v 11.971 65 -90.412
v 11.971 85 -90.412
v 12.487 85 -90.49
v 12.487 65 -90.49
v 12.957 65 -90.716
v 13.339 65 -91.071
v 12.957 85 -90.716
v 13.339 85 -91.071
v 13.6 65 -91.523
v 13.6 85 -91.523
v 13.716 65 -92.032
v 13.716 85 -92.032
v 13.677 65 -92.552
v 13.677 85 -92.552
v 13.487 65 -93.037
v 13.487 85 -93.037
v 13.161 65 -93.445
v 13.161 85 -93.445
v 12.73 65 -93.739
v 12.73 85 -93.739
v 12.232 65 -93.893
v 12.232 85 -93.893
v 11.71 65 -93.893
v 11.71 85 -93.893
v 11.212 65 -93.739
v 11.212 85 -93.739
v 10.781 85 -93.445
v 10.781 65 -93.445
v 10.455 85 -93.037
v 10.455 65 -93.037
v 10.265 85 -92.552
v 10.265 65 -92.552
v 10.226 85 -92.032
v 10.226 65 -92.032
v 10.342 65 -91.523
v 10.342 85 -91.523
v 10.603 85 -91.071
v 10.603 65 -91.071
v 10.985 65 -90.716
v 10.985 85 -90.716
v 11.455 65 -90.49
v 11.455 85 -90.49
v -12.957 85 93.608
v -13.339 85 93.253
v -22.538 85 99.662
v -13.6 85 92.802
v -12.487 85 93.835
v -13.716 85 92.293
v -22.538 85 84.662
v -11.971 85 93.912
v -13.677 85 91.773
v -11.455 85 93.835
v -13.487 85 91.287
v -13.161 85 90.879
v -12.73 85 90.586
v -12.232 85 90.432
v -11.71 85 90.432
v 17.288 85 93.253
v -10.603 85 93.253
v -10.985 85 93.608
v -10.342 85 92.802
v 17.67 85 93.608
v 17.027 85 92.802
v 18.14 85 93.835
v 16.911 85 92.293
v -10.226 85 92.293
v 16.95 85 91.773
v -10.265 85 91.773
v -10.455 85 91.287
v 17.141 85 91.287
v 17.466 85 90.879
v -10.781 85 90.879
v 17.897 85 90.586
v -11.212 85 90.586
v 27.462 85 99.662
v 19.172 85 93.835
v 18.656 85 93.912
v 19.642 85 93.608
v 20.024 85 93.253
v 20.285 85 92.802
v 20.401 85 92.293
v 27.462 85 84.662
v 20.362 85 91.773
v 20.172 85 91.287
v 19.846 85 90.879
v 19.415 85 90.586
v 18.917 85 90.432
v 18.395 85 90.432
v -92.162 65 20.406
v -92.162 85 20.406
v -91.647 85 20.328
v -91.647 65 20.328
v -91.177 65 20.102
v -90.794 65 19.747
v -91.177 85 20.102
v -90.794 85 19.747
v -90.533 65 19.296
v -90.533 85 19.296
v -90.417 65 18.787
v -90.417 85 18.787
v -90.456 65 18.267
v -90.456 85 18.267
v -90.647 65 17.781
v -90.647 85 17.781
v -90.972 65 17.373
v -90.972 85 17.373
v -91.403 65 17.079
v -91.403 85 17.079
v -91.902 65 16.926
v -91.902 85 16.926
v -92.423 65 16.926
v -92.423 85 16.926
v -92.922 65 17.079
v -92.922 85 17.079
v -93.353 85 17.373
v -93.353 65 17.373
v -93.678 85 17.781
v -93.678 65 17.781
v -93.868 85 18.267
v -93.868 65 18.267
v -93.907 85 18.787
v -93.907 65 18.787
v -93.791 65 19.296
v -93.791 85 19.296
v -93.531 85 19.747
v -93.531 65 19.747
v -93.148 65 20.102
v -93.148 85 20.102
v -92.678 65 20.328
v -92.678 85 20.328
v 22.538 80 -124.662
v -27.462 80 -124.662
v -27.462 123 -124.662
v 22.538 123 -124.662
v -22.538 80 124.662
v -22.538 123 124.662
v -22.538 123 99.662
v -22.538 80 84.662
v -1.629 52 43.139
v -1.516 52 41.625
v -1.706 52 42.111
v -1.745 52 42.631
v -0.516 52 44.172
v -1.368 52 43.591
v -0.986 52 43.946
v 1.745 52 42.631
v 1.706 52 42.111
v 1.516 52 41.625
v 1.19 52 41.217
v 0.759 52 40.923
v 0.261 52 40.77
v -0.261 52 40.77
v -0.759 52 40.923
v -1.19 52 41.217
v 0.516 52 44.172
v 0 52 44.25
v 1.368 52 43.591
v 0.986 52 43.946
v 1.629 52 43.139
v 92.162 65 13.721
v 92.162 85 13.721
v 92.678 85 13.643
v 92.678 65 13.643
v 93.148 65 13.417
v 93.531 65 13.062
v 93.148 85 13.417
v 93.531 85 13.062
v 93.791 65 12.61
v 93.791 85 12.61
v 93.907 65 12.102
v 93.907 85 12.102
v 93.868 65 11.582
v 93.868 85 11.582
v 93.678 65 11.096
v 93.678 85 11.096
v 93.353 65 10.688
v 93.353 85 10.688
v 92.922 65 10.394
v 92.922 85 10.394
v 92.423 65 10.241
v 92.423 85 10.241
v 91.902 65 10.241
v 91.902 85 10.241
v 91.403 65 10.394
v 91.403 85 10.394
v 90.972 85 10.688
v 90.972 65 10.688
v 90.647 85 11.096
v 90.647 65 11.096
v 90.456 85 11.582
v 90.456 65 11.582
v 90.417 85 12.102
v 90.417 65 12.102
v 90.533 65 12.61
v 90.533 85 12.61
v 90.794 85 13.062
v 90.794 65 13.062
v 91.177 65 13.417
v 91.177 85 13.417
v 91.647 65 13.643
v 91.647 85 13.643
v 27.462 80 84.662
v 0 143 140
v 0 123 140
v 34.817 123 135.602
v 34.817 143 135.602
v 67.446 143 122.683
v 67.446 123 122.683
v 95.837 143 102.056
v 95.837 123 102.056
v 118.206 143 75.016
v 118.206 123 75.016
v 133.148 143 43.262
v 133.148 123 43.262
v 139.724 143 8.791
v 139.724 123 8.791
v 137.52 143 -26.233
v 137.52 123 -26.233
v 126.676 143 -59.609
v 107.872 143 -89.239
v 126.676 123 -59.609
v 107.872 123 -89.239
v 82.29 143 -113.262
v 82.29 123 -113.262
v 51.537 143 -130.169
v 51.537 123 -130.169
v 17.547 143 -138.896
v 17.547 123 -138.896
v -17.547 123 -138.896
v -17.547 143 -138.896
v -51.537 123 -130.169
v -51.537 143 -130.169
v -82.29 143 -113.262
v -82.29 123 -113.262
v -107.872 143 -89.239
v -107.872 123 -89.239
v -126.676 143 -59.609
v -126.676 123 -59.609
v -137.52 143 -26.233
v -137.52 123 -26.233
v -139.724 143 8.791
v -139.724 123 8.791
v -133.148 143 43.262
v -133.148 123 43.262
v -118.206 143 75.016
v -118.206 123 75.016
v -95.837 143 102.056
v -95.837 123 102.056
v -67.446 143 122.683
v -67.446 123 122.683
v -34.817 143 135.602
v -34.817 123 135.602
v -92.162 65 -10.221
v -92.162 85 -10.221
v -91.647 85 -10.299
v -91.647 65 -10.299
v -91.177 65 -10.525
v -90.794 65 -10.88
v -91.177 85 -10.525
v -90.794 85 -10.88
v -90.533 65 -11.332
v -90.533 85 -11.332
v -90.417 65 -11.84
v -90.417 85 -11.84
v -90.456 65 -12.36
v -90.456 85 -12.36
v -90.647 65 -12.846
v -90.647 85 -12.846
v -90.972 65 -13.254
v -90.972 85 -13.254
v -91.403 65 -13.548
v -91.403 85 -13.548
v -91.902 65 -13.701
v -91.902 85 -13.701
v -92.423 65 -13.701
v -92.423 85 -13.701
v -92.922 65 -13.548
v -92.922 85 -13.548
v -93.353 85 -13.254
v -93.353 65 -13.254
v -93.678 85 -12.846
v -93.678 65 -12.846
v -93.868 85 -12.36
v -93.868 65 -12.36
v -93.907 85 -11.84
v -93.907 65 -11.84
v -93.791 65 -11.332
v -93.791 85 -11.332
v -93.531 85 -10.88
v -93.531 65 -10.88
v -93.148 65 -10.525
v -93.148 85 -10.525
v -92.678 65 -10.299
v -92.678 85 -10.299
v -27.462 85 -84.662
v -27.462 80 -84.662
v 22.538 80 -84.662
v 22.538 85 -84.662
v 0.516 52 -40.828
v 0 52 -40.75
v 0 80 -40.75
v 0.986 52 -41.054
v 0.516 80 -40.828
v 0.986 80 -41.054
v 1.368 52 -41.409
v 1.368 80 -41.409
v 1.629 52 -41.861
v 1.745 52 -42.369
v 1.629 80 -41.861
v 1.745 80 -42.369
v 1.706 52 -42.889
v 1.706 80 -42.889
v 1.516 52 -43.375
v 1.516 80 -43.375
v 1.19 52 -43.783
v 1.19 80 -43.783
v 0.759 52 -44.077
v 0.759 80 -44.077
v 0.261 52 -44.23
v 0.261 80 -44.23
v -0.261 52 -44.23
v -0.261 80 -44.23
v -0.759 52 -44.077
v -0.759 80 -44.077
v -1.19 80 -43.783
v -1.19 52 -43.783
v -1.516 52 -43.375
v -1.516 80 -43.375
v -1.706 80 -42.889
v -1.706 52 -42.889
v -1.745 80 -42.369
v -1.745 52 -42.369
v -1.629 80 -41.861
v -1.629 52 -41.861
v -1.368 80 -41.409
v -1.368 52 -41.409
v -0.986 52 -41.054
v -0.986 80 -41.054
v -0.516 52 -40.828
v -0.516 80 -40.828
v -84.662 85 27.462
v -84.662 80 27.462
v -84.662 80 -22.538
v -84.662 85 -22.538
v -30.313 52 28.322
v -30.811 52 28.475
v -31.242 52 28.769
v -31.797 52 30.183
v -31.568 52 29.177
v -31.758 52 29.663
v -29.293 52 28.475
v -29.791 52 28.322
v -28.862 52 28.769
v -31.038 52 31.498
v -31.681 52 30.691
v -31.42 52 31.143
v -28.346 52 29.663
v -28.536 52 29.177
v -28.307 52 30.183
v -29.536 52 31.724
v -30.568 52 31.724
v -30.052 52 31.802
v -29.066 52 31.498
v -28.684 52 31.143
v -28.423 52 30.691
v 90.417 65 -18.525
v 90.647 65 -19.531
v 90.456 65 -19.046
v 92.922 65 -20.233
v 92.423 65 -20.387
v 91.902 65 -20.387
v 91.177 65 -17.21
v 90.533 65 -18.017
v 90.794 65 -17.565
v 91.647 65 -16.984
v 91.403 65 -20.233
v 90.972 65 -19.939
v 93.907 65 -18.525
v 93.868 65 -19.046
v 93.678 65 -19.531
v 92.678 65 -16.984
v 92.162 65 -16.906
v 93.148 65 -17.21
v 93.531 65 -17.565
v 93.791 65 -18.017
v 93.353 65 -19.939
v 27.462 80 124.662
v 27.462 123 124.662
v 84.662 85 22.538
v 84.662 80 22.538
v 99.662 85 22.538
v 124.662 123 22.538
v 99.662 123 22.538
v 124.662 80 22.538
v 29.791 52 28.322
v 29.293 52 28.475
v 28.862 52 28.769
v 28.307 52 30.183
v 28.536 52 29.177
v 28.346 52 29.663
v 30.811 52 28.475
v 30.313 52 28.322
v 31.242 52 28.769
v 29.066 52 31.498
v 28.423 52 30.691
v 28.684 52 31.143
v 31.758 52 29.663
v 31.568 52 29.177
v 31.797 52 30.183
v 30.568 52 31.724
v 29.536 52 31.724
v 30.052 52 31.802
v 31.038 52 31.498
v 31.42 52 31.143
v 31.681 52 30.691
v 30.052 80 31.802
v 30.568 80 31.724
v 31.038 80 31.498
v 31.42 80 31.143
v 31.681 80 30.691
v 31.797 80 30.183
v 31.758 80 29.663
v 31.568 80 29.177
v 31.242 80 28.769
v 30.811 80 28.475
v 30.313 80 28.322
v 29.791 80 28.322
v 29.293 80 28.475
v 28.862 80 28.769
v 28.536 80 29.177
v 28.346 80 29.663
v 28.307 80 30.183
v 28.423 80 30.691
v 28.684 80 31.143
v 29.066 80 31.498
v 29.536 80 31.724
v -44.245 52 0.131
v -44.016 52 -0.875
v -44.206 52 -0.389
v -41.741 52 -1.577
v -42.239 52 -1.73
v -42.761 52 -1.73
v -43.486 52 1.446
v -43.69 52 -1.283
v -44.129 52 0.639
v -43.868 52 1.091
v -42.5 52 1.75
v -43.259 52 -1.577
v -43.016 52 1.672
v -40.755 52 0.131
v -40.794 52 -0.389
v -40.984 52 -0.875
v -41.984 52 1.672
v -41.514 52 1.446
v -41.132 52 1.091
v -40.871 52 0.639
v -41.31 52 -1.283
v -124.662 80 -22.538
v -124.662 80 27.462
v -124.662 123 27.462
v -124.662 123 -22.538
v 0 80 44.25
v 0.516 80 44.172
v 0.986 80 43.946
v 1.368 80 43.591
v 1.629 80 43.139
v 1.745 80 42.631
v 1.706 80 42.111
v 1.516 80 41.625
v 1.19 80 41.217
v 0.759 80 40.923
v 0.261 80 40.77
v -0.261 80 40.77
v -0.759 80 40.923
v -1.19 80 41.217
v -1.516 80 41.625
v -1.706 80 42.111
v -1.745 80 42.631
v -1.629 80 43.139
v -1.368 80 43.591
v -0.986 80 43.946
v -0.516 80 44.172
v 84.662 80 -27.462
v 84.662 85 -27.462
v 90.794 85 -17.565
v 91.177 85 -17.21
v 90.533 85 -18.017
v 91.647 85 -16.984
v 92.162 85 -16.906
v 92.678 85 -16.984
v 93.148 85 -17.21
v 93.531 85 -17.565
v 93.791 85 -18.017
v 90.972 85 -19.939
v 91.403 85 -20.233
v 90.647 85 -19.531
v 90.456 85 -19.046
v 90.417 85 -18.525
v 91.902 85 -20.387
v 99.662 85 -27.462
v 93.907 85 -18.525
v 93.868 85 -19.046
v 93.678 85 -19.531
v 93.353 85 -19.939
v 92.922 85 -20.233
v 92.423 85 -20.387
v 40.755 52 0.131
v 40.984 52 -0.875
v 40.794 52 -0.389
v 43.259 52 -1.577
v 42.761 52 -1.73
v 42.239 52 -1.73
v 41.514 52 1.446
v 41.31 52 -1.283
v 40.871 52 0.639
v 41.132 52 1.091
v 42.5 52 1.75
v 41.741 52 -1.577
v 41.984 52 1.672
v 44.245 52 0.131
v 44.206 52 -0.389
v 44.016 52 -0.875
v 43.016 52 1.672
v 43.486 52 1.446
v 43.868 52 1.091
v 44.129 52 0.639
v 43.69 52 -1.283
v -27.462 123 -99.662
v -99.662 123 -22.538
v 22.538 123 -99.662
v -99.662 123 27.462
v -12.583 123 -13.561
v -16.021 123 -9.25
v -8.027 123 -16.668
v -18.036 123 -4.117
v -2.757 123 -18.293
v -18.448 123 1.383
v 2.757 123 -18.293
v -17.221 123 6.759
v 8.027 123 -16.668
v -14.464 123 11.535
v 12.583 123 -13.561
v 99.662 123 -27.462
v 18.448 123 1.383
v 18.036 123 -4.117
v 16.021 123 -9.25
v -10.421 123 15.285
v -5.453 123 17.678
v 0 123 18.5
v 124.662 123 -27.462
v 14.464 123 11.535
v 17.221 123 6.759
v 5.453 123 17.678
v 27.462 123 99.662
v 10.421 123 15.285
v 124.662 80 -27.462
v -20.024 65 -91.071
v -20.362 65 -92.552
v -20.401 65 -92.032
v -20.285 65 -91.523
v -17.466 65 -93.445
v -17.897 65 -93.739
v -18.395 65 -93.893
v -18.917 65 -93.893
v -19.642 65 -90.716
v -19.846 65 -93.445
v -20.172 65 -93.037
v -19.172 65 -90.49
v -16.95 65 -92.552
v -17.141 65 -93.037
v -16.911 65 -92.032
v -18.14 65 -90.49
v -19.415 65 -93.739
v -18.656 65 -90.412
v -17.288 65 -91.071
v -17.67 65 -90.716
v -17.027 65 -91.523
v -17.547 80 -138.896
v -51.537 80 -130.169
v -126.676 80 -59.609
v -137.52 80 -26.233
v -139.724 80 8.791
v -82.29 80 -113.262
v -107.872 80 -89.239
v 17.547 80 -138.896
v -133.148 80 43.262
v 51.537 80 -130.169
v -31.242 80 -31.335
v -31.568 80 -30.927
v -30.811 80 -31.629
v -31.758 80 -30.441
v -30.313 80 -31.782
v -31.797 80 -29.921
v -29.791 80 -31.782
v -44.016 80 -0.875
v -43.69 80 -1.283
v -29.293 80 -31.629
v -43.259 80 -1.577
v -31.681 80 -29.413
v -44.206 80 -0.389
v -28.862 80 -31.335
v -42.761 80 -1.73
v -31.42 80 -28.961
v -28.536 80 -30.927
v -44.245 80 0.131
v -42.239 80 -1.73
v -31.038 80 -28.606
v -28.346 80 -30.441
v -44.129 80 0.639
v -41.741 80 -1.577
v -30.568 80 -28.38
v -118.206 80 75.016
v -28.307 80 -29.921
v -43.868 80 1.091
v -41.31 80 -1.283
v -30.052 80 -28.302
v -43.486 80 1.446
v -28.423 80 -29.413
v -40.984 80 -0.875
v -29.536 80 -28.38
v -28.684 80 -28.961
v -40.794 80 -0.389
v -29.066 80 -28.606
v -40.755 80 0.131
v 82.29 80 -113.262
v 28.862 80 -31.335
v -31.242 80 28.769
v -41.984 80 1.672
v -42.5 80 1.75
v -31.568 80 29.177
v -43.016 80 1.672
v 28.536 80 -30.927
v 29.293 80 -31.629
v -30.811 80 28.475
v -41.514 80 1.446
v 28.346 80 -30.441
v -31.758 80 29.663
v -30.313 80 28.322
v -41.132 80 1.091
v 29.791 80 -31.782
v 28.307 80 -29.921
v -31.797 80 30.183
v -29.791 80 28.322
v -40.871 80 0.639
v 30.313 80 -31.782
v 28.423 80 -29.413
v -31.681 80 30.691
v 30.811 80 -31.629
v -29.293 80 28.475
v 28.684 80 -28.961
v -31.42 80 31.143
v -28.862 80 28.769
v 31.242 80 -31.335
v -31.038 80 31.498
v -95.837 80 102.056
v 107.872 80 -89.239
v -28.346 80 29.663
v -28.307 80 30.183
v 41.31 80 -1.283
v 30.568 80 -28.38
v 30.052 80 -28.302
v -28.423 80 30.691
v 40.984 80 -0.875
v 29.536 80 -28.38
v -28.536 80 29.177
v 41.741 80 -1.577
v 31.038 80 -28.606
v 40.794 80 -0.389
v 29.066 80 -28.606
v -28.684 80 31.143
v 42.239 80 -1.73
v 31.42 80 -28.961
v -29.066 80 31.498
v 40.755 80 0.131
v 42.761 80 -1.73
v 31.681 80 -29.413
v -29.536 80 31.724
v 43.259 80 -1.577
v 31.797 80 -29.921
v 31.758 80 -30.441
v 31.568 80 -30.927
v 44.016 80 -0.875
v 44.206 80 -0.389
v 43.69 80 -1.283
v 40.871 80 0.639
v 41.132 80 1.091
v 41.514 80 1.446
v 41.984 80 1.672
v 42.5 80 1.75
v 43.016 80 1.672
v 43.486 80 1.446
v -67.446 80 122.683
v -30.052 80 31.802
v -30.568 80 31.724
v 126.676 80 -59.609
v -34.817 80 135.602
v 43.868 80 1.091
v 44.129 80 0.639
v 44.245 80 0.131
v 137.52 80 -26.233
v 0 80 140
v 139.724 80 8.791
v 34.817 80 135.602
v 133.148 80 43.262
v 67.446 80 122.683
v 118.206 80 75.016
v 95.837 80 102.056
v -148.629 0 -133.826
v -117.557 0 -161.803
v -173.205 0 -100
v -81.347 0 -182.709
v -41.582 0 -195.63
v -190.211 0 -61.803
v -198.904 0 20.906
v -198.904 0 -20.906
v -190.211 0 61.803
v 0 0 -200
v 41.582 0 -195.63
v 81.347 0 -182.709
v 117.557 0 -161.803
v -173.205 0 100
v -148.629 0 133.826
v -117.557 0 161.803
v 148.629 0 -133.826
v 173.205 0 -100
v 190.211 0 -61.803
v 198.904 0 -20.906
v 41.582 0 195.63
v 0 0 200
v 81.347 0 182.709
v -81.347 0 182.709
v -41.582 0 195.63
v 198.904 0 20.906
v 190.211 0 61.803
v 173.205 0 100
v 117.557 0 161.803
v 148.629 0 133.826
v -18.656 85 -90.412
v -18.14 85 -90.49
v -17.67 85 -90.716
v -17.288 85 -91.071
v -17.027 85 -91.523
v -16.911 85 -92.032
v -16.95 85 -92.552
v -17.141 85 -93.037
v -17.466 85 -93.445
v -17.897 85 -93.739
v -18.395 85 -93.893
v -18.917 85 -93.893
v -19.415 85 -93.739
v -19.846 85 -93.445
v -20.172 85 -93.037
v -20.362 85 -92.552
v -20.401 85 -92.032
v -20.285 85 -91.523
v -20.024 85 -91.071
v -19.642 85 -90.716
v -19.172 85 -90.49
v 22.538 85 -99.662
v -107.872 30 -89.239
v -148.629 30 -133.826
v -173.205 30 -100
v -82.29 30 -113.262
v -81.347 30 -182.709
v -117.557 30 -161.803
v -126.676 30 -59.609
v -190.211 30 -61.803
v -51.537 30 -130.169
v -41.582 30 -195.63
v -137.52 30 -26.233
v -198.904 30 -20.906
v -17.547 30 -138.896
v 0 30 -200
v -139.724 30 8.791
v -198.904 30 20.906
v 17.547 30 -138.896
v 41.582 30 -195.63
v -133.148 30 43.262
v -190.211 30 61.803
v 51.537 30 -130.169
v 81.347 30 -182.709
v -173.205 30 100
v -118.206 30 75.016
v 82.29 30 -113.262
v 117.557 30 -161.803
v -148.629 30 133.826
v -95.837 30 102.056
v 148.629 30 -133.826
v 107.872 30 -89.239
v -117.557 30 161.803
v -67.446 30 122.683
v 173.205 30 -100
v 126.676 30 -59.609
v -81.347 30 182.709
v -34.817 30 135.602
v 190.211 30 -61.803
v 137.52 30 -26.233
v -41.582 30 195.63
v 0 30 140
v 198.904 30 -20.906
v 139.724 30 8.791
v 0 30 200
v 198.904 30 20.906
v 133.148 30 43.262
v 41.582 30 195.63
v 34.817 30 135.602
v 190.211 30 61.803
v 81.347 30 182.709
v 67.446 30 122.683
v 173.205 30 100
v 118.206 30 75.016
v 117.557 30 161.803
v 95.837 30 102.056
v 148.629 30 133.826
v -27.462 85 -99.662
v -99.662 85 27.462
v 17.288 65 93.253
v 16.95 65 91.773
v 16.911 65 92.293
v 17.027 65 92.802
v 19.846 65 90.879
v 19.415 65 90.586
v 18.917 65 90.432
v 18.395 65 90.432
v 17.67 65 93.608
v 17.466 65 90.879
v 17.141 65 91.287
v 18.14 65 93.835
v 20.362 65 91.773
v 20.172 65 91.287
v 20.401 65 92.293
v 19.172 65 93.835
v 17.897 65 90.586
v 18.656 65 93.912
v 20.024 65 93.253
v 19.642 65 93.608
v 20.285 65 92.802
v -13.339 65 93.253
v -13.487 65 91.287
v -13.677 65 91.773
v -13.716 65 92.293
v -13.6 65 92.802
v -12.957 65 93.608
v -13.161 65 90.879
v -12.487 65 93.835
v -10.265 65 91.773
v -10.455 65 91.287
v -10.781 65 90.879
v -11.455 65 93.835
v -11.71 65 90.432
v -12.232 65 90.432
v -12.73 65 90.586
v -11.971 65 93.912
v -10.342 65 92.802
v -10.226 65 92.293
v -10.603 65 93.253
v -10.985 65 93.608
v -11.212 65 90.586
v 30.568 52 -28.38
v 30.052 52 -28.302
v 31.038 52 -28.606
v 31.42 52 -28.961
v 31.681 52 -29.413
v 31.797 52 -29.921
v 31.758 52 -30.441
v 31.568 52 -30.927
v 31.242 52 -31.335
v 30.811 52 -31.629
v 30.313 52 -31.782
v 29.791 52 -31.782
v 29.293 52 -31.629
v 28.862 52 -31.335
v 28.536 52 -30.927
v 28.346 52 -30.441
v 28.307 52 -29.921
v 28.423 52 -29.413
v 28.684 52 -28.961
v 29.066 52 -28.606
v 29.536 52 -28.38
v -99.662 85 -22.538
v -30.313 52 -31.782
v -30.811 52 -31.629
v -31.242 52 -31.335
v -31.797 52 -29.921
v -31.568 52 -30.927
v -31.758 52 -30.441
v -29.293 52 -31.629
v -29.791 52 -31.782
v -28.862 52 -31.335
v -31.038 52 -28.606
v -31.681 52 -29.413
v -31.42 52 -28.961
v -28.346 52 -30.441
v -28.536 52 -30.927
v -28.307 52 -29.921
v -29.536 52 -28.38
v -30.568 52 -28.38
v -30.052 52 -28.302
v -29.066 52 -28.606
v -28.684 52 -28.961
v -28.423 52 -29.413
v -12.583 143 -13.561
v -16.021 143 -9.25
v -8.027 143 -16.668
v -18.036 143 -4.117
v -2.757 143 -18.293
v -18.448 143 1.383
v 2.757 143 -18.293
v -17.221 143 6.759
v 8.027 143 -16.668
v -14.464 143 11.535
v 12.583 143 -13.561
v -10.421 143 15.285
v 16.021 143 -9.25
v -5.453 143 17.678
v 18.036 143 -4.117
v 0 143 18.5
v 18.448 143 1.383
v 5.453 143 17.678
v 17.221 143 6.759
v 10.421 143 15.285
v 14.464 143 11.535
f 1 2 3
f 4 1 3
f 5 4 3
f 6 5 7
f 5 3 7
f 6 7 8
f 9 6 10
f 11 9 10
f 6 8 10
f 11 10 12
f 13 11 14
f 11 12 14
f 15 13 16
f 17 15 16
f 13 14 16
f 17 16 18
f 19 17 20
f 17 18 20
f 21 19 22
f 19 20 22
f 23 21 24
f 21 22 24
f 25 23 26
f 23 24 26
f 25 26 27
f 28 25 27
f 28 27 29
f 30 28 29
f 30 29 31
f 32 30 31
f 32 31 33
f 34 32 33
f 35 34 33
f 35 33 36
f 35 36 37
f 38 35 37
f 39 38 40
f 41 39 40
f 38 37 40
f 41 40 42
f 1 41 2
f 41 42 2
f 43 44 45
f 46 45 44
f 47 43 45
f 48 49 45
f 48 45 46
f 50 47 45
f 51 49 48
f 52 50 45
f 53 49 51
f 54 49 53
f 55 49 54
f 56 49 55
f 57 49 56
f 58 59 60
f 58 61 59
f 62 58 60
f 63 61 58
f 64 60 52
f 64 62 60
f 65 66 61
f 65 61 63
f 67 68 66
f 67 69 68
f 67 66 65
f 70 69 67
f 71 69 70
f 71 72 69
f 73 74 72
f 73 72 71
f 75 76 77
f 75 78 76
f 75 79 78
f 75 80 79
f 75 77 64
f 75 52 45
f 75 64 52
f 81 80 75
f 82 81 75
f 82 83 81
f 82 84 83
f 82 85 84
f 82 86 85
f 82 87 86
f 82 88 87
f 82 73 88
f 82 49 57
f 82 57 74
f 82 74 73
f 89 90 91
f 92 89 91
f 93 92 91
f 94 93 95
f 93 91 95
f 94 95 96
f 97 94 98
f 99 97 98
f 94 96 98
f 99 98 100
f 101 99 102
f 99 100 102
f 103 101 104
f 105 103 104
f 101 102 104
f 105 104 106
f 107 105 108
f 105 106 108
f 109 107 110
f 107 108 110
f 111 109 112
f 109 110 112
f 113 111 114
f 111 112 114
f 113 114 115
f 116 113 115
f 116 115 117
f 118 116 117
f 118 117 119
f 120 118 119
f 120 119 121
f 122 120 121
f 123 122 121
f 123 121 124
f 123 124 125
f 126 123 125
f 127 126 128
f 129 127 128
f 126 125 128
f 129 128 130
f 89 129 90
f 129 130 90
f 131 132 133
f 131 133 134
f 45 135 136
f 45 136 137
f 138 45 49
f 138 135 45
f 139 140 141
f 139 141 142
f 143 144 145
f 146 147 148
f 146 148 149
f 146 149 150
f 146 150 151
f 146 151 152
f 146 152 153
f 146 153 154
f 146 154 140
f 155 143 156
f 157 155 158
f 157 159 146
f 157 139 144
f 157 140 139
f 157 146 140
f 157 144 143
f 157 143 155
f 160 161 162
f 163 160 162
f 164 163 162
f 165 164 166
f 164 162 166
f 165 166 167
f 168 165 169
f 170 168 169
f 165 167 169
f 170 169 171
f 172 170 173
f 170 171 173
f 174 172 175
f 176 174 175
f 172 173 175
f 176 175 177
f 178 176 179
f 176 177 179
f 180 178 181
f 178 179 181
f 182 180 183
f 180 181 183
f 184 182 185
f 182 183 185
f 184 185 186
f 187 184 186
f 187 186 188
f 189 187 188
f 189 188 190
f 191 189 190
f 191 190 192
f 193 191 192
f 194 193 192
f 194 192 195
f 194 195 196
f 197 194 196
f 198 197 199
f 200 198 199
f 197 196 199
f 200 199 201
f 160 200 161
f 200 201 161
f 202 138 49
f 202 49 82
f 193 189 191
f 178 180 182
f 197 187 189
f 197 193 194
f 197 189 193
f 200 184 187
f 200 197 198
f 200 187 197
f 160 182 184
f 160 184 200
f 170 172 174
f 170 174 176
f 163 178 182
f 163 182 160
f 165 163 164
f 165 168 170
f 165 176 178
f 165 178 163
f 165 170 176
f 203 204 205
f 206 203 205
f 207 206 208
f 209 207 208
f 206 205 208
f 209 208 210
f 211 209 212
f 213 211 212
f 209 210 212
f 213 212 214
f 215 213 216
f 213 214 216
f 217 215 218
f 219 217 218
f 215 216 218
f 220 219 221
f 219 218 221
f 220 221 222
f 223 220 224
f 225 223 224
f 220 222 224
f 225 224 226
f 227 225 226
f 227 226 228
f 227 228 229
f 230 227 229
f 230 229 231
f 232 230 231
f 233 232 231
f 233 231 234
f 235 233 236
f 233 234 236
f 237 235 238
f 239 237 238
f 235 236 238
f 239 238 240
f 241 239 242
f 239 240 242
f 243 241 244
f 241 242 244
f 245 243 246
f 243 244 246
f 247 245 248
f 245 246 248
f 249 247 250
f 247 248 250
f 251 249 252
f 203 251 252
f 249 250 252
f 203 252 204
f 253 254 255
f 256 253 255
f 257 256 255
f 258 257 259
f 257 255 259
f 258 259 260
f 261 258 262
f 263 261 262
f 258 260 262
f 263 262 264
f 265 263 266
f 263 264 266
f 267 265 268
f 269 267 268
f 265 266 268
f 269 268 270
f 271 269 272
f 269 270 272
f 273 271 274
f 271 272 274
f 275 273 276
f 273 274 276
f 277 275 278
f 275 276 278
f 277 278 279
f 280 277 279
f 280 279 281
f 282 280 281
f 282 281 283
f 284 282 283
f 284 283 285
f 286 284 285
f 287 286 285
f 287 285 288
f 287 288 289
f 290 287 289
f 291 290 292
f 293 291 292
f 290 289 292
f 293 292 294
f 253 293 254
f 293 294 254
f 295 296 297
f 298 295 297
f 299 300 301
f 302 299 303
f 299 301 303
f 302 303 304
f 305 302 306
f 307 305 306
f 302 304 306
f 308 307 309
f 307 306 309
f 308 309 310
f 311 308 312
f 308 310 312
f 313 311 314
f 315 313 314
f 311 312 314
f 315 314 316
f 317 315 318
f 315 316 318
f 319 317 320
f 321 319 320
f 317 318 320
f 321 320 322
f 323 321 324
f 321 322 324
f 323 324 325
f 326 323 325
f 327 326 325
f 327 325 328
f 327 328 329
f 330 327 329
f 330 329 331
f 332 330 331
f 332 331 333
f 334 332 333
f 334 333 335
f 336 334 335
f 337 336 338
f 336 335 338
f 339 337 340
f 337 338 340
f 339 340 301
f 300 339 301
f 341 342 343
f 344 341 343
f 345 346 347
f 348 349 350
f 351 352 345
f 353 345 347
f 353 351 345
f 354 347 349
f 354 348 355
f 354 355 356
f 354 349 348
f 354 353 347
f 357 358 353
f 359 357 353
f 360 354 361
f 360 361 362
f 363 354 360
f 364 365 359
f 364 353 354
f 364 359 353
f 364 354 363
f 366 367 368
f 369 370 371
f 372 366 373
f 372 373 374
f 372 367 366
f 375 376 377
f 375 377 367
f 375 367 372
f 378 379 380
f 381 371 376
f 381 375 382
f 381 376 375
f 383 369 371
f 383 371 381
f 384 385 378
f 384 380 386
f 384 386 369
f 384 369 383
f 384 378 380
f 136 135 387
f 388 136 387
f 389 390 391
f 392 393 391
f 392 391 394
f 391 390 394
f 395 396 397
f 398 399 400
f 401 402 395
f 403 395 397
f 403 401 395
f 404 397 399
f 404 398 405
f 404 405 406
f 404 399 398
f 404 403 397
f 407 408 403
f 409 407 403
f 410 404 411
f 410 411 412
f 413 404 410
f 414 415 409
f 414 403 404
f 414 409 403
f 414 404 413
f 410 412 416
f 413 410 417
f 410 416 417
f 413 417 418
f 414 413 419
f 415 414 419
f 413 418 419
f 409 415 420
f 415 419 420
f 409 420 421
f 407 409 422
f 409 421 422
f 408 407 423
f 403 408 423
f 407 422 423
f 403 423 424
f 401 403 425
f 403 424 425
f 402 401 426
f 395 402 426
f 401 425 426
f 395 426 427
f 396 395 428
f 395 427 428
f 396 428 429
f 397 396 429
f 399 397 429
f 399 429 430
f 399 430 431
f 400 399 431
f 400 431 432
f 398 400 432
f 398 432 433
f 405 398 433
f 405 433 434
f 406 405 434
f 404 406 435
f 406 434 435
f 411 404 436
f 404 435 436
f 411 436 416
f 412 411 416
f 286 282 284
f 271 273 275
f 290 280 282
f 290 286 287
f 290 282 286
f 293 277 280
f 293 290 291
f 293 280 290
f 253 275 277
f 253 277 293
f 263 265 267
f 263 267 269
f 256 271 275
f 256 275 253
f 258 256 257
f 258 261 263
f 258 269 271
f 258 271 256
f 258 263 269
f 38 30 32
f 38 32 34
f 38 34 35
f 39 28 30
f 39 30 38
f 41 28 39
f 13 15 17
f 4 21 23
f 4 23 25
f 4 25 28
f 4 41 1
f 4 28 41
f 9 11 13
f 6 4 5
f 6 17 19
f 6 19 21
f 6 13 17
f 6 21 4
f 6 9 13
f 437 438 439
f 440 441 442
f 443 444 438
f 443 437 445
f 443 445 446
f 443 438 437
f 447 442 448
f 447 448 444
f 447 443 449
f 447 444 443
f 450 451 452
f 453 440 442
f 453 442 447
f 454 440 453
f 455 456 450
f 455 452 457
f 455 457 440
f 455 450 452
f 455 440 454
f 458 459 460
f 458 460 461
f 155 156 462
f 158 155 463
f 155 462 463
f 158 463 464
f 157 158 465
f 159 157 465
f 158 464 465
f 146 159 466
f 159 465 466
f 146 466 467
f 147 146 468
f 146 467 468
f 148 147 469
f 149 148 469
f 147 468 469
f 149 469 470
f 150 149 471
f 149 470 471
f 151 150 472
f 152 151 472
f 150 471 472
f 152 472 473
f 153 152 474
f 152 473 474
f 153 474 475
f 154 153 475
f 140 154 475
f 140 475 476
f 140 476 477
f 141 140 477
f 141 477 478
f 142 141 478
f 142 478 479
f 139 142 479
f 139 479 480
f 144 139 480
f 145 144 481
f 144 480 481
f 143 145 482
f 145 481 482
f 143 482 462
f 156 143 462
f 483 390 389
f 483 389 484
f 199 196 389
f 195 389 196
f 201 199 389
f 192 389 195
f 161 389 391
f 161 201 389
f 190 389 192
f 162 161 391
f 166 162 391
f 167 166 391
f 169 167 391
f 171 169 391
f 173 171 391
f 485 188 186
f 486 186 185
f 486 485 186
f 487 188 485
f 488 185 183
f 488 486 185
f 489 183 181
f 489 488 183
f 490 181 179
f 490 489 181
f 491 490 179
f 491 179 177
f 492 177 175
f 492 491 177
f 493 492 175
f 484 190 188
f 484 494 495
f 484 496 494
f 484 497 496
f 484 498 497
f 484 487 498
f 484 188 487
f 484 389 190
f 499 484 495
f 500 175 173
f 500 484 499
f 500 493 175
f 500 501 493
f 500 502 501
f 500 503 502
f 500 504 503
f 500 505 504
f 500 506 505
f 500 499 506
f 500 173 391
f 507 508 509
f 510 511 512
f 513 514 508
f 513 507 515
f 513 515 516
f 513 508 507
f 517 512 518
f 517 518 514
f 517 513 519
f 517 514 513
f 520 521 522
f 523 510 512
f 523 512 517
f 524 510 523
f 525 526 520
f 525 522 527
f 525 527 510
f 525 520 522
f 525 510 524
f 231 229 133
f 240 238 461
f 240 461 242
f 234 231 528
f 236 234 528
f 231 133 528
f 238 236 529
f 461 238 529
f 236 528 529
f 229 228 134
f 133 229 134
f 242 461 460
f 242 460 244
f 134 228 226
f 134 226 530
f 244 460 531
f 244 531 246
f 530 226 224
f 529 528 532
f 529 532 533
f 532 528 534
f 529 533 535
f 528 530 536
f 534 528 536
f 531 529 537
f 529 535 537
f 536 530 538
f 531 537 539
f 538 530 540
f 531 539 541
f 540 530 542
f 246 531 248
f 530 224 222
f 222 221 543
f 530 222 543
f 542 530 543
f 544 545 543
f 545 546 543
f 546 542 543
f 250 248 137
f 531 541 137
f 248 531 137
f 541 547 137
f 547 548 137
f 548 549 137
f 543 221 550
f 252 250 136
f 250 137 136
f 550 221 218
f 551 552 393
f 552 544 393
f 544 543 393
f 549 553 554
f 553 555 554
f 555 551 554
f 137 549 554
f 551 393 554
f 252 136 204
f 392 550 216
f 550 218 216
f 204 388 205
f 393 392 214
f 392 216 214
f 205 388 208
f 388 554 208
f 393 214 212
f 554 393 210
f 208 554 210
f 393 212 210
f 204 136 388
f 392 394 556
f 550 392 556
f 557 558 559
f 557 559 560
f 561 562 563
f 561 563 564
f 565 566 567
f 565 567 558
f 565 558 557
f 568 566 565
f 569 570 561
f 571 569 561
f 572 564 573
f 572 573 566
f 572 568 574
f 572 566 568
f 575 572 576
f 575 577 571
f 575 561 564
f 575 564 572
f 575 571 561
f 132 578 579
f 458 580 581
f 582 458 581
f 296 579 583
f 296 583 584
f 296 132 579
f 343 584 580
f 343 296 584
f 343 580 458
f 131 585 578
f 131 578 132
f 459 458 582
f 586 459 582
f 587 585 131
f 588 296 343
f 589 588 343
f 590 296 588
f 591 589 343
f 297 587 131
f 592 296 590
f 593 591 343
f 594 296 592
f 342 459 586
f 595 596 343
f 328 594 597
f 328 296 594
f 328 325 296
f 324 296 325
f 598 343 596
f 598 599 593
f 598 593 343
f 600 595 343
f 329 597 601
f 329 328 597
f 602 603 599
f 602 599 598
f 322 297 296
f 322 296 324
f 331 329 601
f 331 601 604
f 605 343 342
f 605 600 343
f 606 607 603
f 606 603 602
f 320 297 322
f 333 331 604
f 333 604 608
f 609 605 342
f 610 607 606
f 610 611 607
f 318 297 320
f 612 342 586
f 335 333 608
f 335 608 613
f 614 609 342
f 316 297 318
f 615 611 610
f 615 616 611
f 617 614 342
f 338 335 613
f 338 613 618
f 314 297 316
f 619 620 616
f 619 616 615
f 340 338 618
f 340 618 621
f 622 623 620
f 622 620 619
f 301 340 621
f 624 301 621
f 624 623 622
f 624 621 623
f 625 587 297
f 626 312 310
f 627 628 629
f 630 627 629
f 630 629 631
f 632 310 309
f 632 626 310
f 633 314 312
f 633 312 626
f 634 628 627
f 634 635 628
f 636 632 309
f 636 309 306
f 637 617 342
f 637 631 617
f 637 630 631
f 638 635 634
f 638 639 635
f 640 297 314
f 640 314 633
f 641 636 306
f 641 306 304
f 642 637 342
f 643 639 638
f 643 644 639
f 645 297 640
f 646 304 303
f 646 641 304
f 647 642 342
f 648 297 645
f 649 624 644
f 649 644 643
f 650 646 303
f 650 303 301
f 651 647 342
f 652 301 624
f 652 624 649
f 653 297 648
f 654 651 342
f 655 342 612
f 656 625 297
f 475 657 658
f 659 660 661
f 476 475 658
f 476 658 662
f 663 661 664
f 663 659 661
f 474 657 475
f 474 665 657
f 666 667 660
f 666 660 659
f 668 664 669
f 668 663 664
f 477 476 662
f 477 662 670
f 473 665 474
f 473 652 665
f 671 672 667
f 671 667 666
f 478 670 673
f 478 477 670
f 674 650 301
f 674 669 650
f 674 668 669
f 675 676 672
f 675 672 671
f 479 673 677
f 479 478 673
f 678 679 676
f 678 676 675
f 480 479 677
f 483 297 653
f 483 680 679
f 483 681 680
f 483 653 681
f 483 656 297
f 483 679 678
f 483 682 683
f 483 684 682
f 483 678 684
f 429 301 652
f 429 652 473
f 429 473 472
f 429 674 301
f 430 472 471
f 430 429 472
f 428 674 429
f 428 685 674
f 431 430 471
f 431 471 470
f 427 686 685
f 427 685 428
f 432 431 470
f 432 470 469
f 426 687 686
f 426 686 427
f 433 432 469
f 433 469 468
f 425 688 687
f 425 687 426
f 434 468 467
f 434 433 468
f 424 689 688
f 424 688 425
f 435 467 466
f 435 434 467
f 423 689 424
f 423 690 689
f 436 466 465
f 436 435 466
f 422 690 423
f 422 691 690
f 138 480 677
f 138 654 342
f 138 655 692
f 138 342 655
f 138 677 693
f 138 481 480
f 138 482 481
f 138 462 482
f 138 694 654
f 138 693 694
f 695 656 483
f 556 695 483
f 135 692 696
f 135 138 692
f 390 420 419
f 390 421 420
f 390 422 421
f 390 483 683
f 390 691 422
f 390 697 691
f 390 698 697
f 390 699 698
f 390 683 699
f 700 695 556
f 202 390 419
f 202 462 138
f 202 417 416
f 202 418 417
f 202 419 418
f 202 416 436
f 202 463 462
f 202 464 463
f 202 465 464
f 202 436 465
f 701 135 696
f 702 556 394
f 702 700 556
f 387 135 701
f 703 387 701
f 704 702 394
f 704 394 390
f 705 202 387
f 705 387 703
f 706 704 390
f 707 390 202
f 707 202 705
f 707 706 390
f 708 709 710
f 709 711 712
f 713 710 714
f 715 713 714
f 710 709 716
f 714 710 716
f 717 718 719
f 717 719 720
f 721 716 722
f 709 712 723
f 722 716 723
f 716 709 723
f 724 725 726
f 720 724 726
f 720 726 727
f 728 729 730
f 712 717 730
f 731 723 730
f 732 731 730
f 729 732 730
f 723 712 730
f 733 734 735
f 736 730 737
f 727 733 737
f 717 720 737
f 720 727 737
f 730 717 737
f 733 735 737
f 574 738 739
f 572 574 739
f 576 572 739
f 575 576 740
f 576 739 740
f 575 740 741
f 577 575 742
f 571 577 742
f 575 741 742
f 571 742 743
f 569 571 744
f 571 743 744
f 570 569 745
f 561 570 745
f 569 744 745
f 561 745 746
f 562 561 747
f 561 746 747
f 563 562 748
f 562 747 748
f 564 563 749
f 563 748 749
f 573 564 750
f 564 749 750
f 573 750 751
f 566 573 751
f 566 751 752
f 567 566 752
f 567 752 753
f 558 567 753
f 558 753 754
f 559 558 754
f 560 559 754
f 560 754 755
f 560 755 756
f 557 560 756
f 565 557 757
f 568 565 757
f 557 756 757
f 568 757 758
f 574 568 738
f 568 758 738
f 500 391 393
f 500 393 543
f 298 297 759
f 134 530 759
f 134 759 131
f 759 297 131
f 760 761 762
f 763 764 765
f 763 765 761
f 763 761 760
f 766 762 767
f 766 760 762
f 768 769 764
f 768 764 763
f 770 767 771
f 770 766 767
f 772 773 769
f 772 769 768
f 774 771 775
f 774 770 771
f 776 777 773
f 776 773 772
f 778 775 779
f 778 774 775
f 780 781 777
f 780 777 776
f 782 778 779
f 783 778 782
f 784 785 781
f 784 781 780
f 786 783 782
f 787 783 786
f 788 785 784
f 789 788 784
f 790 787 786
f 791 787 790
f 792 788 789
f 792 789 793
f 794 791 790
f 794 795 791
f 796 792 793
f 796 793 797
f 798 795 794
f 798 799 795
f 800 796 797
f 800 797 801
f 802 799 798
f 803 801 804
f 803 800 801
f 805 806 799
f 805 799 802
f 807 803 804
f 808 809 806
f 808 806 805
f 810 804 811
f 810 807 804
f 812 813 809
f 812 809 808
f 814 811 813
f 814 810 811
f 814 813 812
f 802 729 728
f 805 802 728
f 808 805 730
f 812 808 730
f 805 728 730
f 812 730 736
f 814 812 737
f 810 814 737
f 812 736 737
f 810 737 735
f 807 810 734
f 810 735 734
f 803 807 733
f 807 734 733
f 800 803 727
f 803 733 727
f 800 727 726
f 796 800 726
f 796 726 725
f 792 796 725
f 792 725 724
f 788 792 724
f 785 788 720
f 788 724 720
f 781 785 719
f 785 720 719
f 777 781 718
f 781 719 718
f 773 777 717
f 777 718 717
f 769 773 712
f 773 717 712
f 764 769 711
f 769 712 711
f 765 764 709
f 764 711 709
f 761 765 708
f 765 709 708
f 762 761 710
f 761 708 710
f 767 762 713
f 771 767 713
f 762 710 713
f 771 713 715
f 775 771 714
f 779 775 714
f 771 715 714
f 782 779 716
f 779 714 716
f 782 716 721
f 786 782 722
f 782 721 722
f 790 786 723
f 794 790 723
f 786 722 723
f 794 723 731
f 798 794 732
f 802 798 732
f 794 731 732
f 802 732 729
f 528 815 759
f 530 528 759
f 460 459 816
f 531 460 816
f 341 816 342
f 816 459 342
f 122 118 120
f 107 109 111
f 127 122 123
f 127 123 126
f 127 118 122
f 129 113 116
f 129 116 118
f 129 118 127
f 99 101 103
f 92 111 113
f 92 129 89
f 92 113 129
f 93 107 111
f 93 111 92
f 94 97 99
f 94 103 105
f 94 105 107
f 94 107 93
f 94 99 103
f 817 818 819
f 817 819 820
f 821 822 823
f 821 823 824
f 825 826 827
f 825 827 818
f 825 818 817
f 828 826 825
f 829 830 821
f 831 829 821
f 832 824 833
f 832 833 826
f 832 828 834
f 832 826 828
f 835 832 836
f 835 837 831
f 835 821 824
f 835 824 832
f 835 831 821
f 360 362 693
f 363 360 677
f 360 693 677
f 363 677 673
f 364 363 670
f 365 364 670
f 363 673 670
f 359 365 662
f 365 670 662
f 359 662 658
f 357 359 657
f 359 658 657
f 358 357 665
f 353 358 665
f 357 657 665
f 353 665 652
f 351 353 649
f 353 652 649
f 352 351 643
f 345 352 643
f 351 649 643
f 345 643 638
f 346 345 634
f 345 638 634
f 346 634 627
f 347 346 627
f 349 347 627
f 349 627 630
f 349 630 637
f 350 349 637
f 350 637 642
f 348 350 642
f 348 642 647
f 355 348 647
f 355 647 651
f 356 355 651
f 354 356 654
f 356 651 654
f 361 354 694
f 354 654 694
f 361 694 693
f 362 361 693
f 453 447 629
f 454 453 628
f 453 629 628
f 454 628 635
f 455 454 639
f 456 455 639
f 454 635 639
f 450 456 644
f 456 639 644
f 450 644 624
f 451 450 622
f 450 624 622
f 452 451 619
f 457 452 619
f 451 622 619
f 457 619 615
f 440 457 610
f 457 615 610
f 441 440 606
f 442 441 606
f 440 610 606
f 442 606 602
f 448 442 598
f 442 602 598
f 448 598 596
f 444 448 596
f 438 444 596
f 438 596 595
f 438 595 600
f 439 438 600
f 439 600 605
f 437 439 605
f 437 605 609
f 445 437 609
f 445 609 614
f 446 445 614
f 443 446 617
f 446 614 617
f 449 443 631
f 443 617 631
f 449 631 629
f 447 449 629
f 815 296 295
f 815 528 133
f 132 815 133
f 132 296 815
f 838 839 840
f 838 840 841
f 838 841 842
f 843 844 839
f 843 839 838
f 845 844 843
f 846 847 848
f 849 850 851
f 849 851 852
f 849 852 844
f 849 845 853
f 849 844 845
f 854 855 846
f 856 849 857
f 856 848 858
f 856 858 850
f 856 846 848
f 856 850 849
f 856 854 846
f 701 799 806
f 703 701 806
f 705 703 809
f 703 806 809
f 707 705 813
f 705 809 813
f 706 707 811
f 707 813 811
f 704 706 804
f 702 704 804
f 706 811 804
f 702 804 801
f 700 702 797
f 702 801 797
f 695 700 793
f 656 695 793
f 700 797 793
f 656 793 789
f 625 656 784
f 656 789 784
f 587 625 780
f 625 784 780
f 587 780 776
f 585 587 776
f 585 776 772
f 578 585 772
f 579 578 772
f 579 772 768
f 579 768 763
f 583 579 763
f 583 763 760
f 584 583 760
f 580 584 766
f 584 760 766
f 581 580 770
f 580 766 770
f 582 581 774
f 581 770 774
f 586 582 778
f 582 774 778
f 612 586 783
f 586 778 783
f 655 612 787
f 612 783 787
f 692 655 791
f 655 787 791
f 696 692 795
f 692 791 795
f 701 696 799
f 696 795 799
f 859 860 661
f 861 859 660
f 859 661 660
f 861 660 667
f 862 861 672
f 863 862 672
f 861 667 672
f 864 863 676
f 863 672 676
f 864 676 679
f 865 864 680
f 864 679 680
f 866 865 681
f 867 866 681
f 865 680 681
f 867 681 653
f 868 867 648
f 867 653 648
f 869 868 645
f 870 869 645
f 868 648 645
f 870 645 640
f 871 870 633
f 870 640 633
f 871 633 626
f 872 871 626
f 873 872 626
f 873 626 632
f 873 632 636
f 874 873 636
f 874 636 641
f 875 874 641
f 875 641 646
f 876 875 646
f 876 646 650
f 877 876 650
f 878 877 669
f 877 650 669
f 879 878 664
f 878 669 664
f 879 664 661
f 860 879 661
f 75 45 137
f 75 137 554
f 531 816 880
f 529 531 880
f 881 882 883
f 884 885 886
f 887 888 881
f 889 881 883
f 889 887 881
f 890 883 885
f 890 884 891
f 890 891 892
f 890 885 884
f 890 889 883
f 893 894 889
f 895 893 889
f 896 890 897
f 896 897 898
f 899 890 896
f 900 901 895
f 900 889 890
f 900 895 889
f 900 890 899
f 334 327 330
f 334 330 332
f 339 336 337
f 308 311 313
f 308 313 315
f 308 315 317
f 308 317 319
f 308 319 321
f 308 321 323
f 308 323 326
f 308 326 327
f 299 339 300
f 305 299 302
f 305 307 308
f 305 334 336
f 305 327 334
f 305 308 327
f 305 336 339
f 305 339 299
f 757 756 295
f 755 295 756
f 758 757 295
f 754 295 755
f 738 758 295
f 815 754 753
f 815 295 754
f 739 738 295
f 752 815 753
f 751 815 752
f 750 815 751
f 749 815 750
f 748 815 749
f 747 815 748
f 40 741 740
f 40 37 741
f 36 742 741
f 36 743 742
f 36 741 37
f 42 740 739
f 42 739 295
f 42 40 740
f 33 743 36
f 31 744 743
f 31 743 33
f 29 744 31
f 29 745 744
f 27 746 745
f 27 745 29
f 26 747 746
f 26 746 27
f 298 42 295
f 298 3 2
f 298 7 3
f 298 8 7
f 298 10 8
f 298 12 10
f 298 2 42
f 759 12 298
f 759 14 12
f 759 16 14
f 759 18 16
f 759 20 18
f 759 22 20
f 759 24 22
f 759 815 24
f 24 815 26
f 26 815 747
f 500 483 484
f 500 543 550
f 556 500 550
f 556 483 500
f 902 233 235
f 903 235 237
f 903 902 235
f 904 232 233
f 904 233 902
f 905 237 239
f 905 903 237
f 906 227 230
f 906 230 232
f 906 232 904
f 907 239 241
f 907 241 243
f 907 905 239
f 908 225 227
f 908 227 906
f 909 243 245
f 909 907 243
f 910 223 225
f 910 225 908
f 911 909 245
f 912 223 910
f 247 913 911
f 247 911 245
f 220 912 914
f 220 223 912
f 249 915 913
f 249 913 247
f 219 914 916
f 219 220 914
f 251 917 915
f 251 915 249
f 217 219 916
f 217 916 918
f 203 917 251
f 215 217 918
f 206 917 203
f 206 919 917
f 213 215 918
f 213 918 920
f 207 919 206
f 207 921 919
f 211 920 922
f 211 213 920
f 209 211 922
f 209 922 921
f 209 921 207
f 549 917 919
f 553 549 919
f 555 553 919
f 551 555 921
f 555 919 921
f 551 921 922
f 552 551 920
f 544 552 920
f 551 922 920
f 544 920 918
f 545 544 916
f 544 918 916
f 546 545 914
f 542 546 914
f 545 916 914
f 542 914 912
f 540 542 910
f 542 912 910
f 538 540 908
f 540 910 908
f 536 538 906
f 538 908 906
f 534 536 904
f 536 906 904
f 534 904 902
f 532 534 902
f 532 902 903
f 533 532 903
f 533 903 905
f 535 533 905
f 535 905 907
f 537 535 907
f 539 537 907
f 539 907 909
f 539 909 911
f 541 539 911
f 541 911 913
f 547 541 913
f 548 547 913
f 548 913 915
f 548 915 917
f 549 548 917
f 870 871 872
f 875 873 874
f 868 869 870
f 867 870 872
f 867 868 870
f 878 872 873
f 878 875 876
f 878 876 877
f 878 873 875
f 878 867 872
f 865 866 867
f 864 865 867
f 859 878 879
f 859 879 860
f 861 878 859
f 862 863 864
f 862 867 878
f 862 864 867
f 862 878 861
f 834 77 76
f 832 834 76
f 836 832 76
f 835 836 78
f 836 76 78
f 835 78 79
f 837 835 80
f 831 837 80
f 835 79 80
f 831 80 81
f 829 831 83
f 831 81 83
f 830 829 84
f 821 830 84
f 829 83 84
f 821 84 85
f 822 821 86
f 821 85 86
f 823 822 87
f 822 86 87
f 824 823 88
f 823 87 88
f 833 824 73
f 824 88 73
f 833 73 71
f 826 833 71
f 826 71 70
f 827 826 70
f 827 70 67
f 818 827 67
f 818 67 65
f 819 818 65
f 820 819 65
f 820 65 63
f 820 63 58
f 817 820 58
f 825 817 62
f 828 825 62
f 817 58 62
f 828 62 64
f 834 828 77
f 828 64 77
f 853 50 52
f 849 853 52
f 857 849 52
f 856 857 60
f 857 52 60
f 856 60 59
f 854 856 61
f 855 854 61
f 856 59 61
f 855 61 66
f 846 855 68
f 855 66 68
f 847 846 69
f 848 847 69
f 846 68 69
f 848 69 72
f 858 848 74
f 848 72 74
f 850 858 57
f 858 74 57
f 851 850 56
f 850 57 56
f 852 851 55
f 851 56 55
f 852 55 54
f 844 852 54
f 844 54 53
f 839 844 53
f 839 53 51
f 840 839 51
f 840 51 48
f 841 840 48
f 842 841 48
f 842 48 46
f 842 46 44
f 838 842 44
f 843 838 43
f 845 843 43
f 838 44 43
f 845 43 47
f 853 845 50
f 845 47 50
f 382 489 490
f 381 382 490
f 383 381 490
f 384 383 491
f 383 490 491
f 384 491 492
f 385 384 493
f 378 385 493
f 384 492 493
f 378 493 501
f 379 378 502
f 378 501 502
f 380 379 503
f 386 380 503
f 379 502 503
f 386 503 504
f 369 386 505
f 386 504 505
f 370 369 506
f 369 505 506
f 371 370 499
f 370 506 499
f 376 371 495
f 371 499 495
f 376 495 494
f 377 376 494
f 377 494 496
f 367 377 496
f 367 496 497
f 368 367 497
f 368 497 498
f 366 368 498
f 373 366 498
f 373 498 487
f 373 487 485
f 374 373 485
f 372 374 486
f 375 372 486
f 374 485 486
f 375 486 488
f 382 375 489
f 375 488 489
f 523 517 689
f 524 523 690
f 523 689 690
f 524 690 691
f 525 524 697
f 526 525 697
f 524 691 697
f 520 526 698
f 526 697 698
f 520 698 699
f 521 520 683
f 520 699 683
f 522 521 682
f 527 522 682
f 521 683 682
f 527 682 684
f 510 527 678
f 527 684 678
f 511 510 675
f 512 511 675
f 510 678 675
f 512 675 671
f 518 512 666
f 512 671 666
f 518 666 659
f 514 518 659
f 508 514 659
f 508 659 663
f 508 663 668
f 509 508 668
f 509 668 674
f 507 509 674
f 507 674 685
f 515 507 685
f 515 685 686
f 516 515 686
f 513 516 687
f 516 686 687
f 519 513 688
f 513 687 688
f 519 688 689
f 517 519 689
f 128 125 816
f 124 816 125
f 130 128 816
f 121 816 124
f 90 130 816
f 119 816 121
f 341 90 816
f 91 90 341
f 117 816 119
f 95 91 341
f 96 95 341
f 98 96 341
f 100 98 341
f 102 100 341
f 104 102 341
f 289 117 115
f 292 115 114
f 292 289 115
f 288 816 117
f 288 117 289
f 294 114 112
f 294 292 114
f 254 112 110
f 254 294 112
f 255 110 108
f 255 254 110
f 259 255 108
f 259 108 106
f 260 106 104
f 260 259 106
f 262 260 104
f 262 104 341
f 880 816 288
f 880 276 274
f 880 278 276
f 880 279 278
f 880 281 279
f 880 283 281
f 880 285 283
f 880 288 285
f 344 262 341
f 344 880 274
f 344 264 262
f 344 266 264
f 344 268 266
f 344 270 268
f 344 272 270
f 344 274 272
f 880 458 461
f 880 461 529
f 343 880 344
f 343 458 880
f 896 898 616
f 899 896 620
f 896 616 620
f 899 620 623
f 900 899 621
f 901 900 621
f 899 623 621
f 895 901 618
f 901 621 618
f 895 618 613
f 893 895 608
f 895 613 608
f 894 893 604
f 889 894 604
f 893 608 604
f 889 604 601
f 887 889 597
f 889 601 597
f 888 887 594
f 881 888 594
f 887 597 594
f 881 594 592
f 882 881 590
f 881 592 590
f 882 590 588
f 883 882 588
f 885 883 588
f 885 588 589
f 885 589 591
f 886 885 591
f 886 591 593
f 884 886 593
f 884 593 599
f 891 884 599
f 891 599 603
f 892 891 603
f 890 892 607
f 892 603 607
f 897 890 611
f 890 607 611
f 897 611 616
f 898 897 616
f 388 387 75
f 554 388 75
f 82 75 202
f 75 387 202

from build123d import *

# Parameters (mm, degrees)
SKETCH_1_R          = 200
EXTRUDE_1_DEPTH     = 30
SKETCH_2_R          = 140
EXTRUDE_2_DEPTH     = 50
SKETCH_4_R          = 1.75
CUT_EXTRUDE_1_DEPTH = 28
SKETCH_7_W          = 25
SKETCH_7_H          = 50
SKETCH_7_W_2        = 50
SKETCH_7_H_2        = 25
EXTRUDE_5_DEPTH     = 43
SKETCH_8_W          = 15
SKETCH_8_H          = 50
SKETCH_8_W_2        = 50
SKETCH_8_H_2        = 15
EXTRUDE_6_DEPTH     = 5
SKETCH_9_R          = 1.75
CUT_EXTRUDE_2_DEPTH = 20
SKETCH_10_R         = 140
EXTRUDE_7_DEPTH     = 20
SKETCH_11_R         = 2.5
CUT_EXTRUDE_3_DEPTH = 20
CUT_EXTRUDE_4_REACH = 318.937
SKETCH_13_R         = 18.5


with BuildPart() as part:
    # 草图1 → 凸台-拉伸1 (new body)
    with BuildSketch(Plane(origin=(0, 0, 0), x_dir=(1, 0, 0), z_dir=(0, 1, 0))):
        with Locations(Location((0, 0, 0), (0, 0, 270))):
            Circle(SKETCH_1_R)
    extrude(amount=EXTRUDE_1_DEPTH)

    # 草图2 → 凸台-拉伸2 (add)
    with BuildSketch(Plane(origin=(0, 30, 0), x_dir=(1, 0, 0), z_dir=(0, 1, 0))):
        with Locations(Location((0, 0, 0), (0, 0, 270))):
            Circle(SKETCH_2_R)
    extrude(amount=EXTRUDE_2_DEPTH)

    # 草图4 → 切除-拉伸1 (cut)
    with BuildSketch(Plane(origin=(0, 80, 0), x_dir=(1, 0, 0), z_dir=(0, 1, 0))):
        with Locations(Location((0, -42.5, 0), (0, 0, 270))):
            Circle(SKETCH_4_R)
        with Locations(Location((-30.0520382, -30.0520382, 0), (0, 0, 270))):
            Circle(SKETCH_4_R)
        with Locations(Location((-42.5, 0, 0), (0, 0, 270))):
            Circle(SKETCH_4_R)
        with Locations(Location((-30.0520382, 30.0520382, 0), (0, 0, 270))):
            Circle(SKETCH_4_R)
        with Locations(Location((0, 42.5, 0), (0, 0, 270))):
            Circle(SKETCH_4_R)
        with Locations(Location((30.0520382, 30.0520382, 0), (0, 0, 270))):
            Circle(SKETCH_4_R)
        with Locations(Location((42.5, 0, 0), (0, 0, 270))):
            Circle(SKETCH_4_R)
        with Locations(Location((30.0520382, -30.0520382, 0), (0, 0, 270))):
            Circle(SKETCH_4_R)
    extrude(amount=-CUT_EXTRUDE_1_DEPTH, mode=Mode.SUBTRACT)

    # 草图7 → 凸台-拉伸5 (add)
    with BuildSketch(Plane(origin=(0, 80, 0), x_dir=(1, 0, 0), z_dir=(0, 1, 0))):
        with Locations((-112.162325809, -2.462481049)):
            Rectangle(SKETCH_7_W, SKETCH_7_H)
        with Locations((2.462481049, -112.162325809)):
            Rectangle(SKETCH_7_W_2, SKETCH_7_H_2)
        with Locations((-2.462481049, 112.162325809)):
            Rectangle(SKETCH_7_W_2, SKETCH_7_H_2)
        with Locations((112.162325809, 2.462481049)):
            Rectangle(SKETCH_7_W, SKETCH_7_H)
    extrude(amount=EXTRUDE_5_DEPTH)

    # 草图8 → 凸台-拉伸6 (add)
    with BuildSketch(Plane(origin=(0, 80, 0), x_dir=(1, 0, 0), z_dir=(0, 1, 0))):
        with Locations((92.162325809, 2.462481049)):
            Rectangle(SKETCH_8_W, SKETCH_8_H)
        with Locations((-2.462481049, 92.162325809)):
            Rectangle(SKETCH_8_W_2, SKETCH_8_H_2)
        with Locations((2.462481049, -92.162325809)):
            Rectangle(SKETCH_8_W_2, SKETCH_8_H_2)
        with Locations((-92.162325809, -2.462481049)):
            Rectangle(SKETCH_8_W, SKETCH_8_H)
    extrude(amount=EXTRUDE_6_DEPTH)

    # 草图9 → 切除-拉伸2 (cut)
    with BuildSketch(Plane(origin=(0, 85, 0), x_dir=(1, 0, 0), z_dir=(0, 1, 0))):
        with Locations(Location((18.656155403, -92.162325809, 0), (0, 0, 270))):
            Circle(SKETCH_9_R)
        with Locations(Location((-11.970984699, -92.162325809, 0), (0, 0, 270))):
            Circle(SKETCH_9_R)
        with Locations(Location((-92.162325809, 11.970984699, 0), (0, 0, 270))):
            Circle(SKETCH_9_R)
        with Locations(Location((-92.162325809, -18.656155403, 0), (0, 0, 270))):
            Circle(SKETCH_9_R)
        with Locations(Location((11.970984699, 92.162325809, 0), (0, 0, 270))):
            Circle(SKETCH_9_R)
        with Locations(Location((-18.656155403, 92.162325809, 0), (0, 0, 270))):
            Circle(SKETCH_9_R)
        with Locations(Location((92.162325809, -11.970984699, 0), (0, 0, 270))):
            Circle(SKETCH_9_R)
        with Locations(Location((92.162325809, 18.656155403, 0), (0, 0, 270))):
            Circle(SKETCH_9_R)
    extrude(amount=-CUT_EXTRUDE_2_DEPTH, mode=Mode.SUBTRACT)

    # 草图10 → 凸台-拉伸7 (add)
    with BuildSketch(Plane(origin=(0, 123, 0), x_dir=(1, 0, 0), z_dir=(0, 1, 0))):
        with Locations(Location((0, 0, 0), (0, 0, 270))):
            Circle(SKETCH_10_R)
    extrude(amount=EXTRUDE_7_DEPTH)

    # 草图11 → 切除-拉伸3 (cut)
    with BuildSketch(Plane(origin=(0, 143, 0), x_dir=(1, 0, 0), z_dir=(0, 1, 0))):
        with Locations(Location((0, 0, 0), (0, 0, 270))):
            Circle(SKETCH_11_R)
    extrude(amount=-CUT_EXTRUDE_3_DEPTH, mode=Mode.SUBTRACT)

    # 草图13 → 切除-拉伸4 (cut, up to next)
    with BuildSketch(Plane(origin=(0, 143, 0), x_dir=(1, 0, 0), z_dir=(0, 1, 0)), mode=Mode.PRIVATE) as cut_extrude_4_sk1:
        with Locations(Location((0, 0, 0), (0, 0, 270))):
            Circle(SKETCH_13_R)
    cut_extrude_4_tool1 = extrude(cut_extrude_4_sk1.sketch, amount=-CUT_EXTRUDE_4_REACH, mode=Mode.PRIVATE) & part.part
    add(cut_extrude_4_tool1.solids().sort_by_distance((0, 143, 0))[0], mode=Mode.SUBTRACT)


solid = part.part
